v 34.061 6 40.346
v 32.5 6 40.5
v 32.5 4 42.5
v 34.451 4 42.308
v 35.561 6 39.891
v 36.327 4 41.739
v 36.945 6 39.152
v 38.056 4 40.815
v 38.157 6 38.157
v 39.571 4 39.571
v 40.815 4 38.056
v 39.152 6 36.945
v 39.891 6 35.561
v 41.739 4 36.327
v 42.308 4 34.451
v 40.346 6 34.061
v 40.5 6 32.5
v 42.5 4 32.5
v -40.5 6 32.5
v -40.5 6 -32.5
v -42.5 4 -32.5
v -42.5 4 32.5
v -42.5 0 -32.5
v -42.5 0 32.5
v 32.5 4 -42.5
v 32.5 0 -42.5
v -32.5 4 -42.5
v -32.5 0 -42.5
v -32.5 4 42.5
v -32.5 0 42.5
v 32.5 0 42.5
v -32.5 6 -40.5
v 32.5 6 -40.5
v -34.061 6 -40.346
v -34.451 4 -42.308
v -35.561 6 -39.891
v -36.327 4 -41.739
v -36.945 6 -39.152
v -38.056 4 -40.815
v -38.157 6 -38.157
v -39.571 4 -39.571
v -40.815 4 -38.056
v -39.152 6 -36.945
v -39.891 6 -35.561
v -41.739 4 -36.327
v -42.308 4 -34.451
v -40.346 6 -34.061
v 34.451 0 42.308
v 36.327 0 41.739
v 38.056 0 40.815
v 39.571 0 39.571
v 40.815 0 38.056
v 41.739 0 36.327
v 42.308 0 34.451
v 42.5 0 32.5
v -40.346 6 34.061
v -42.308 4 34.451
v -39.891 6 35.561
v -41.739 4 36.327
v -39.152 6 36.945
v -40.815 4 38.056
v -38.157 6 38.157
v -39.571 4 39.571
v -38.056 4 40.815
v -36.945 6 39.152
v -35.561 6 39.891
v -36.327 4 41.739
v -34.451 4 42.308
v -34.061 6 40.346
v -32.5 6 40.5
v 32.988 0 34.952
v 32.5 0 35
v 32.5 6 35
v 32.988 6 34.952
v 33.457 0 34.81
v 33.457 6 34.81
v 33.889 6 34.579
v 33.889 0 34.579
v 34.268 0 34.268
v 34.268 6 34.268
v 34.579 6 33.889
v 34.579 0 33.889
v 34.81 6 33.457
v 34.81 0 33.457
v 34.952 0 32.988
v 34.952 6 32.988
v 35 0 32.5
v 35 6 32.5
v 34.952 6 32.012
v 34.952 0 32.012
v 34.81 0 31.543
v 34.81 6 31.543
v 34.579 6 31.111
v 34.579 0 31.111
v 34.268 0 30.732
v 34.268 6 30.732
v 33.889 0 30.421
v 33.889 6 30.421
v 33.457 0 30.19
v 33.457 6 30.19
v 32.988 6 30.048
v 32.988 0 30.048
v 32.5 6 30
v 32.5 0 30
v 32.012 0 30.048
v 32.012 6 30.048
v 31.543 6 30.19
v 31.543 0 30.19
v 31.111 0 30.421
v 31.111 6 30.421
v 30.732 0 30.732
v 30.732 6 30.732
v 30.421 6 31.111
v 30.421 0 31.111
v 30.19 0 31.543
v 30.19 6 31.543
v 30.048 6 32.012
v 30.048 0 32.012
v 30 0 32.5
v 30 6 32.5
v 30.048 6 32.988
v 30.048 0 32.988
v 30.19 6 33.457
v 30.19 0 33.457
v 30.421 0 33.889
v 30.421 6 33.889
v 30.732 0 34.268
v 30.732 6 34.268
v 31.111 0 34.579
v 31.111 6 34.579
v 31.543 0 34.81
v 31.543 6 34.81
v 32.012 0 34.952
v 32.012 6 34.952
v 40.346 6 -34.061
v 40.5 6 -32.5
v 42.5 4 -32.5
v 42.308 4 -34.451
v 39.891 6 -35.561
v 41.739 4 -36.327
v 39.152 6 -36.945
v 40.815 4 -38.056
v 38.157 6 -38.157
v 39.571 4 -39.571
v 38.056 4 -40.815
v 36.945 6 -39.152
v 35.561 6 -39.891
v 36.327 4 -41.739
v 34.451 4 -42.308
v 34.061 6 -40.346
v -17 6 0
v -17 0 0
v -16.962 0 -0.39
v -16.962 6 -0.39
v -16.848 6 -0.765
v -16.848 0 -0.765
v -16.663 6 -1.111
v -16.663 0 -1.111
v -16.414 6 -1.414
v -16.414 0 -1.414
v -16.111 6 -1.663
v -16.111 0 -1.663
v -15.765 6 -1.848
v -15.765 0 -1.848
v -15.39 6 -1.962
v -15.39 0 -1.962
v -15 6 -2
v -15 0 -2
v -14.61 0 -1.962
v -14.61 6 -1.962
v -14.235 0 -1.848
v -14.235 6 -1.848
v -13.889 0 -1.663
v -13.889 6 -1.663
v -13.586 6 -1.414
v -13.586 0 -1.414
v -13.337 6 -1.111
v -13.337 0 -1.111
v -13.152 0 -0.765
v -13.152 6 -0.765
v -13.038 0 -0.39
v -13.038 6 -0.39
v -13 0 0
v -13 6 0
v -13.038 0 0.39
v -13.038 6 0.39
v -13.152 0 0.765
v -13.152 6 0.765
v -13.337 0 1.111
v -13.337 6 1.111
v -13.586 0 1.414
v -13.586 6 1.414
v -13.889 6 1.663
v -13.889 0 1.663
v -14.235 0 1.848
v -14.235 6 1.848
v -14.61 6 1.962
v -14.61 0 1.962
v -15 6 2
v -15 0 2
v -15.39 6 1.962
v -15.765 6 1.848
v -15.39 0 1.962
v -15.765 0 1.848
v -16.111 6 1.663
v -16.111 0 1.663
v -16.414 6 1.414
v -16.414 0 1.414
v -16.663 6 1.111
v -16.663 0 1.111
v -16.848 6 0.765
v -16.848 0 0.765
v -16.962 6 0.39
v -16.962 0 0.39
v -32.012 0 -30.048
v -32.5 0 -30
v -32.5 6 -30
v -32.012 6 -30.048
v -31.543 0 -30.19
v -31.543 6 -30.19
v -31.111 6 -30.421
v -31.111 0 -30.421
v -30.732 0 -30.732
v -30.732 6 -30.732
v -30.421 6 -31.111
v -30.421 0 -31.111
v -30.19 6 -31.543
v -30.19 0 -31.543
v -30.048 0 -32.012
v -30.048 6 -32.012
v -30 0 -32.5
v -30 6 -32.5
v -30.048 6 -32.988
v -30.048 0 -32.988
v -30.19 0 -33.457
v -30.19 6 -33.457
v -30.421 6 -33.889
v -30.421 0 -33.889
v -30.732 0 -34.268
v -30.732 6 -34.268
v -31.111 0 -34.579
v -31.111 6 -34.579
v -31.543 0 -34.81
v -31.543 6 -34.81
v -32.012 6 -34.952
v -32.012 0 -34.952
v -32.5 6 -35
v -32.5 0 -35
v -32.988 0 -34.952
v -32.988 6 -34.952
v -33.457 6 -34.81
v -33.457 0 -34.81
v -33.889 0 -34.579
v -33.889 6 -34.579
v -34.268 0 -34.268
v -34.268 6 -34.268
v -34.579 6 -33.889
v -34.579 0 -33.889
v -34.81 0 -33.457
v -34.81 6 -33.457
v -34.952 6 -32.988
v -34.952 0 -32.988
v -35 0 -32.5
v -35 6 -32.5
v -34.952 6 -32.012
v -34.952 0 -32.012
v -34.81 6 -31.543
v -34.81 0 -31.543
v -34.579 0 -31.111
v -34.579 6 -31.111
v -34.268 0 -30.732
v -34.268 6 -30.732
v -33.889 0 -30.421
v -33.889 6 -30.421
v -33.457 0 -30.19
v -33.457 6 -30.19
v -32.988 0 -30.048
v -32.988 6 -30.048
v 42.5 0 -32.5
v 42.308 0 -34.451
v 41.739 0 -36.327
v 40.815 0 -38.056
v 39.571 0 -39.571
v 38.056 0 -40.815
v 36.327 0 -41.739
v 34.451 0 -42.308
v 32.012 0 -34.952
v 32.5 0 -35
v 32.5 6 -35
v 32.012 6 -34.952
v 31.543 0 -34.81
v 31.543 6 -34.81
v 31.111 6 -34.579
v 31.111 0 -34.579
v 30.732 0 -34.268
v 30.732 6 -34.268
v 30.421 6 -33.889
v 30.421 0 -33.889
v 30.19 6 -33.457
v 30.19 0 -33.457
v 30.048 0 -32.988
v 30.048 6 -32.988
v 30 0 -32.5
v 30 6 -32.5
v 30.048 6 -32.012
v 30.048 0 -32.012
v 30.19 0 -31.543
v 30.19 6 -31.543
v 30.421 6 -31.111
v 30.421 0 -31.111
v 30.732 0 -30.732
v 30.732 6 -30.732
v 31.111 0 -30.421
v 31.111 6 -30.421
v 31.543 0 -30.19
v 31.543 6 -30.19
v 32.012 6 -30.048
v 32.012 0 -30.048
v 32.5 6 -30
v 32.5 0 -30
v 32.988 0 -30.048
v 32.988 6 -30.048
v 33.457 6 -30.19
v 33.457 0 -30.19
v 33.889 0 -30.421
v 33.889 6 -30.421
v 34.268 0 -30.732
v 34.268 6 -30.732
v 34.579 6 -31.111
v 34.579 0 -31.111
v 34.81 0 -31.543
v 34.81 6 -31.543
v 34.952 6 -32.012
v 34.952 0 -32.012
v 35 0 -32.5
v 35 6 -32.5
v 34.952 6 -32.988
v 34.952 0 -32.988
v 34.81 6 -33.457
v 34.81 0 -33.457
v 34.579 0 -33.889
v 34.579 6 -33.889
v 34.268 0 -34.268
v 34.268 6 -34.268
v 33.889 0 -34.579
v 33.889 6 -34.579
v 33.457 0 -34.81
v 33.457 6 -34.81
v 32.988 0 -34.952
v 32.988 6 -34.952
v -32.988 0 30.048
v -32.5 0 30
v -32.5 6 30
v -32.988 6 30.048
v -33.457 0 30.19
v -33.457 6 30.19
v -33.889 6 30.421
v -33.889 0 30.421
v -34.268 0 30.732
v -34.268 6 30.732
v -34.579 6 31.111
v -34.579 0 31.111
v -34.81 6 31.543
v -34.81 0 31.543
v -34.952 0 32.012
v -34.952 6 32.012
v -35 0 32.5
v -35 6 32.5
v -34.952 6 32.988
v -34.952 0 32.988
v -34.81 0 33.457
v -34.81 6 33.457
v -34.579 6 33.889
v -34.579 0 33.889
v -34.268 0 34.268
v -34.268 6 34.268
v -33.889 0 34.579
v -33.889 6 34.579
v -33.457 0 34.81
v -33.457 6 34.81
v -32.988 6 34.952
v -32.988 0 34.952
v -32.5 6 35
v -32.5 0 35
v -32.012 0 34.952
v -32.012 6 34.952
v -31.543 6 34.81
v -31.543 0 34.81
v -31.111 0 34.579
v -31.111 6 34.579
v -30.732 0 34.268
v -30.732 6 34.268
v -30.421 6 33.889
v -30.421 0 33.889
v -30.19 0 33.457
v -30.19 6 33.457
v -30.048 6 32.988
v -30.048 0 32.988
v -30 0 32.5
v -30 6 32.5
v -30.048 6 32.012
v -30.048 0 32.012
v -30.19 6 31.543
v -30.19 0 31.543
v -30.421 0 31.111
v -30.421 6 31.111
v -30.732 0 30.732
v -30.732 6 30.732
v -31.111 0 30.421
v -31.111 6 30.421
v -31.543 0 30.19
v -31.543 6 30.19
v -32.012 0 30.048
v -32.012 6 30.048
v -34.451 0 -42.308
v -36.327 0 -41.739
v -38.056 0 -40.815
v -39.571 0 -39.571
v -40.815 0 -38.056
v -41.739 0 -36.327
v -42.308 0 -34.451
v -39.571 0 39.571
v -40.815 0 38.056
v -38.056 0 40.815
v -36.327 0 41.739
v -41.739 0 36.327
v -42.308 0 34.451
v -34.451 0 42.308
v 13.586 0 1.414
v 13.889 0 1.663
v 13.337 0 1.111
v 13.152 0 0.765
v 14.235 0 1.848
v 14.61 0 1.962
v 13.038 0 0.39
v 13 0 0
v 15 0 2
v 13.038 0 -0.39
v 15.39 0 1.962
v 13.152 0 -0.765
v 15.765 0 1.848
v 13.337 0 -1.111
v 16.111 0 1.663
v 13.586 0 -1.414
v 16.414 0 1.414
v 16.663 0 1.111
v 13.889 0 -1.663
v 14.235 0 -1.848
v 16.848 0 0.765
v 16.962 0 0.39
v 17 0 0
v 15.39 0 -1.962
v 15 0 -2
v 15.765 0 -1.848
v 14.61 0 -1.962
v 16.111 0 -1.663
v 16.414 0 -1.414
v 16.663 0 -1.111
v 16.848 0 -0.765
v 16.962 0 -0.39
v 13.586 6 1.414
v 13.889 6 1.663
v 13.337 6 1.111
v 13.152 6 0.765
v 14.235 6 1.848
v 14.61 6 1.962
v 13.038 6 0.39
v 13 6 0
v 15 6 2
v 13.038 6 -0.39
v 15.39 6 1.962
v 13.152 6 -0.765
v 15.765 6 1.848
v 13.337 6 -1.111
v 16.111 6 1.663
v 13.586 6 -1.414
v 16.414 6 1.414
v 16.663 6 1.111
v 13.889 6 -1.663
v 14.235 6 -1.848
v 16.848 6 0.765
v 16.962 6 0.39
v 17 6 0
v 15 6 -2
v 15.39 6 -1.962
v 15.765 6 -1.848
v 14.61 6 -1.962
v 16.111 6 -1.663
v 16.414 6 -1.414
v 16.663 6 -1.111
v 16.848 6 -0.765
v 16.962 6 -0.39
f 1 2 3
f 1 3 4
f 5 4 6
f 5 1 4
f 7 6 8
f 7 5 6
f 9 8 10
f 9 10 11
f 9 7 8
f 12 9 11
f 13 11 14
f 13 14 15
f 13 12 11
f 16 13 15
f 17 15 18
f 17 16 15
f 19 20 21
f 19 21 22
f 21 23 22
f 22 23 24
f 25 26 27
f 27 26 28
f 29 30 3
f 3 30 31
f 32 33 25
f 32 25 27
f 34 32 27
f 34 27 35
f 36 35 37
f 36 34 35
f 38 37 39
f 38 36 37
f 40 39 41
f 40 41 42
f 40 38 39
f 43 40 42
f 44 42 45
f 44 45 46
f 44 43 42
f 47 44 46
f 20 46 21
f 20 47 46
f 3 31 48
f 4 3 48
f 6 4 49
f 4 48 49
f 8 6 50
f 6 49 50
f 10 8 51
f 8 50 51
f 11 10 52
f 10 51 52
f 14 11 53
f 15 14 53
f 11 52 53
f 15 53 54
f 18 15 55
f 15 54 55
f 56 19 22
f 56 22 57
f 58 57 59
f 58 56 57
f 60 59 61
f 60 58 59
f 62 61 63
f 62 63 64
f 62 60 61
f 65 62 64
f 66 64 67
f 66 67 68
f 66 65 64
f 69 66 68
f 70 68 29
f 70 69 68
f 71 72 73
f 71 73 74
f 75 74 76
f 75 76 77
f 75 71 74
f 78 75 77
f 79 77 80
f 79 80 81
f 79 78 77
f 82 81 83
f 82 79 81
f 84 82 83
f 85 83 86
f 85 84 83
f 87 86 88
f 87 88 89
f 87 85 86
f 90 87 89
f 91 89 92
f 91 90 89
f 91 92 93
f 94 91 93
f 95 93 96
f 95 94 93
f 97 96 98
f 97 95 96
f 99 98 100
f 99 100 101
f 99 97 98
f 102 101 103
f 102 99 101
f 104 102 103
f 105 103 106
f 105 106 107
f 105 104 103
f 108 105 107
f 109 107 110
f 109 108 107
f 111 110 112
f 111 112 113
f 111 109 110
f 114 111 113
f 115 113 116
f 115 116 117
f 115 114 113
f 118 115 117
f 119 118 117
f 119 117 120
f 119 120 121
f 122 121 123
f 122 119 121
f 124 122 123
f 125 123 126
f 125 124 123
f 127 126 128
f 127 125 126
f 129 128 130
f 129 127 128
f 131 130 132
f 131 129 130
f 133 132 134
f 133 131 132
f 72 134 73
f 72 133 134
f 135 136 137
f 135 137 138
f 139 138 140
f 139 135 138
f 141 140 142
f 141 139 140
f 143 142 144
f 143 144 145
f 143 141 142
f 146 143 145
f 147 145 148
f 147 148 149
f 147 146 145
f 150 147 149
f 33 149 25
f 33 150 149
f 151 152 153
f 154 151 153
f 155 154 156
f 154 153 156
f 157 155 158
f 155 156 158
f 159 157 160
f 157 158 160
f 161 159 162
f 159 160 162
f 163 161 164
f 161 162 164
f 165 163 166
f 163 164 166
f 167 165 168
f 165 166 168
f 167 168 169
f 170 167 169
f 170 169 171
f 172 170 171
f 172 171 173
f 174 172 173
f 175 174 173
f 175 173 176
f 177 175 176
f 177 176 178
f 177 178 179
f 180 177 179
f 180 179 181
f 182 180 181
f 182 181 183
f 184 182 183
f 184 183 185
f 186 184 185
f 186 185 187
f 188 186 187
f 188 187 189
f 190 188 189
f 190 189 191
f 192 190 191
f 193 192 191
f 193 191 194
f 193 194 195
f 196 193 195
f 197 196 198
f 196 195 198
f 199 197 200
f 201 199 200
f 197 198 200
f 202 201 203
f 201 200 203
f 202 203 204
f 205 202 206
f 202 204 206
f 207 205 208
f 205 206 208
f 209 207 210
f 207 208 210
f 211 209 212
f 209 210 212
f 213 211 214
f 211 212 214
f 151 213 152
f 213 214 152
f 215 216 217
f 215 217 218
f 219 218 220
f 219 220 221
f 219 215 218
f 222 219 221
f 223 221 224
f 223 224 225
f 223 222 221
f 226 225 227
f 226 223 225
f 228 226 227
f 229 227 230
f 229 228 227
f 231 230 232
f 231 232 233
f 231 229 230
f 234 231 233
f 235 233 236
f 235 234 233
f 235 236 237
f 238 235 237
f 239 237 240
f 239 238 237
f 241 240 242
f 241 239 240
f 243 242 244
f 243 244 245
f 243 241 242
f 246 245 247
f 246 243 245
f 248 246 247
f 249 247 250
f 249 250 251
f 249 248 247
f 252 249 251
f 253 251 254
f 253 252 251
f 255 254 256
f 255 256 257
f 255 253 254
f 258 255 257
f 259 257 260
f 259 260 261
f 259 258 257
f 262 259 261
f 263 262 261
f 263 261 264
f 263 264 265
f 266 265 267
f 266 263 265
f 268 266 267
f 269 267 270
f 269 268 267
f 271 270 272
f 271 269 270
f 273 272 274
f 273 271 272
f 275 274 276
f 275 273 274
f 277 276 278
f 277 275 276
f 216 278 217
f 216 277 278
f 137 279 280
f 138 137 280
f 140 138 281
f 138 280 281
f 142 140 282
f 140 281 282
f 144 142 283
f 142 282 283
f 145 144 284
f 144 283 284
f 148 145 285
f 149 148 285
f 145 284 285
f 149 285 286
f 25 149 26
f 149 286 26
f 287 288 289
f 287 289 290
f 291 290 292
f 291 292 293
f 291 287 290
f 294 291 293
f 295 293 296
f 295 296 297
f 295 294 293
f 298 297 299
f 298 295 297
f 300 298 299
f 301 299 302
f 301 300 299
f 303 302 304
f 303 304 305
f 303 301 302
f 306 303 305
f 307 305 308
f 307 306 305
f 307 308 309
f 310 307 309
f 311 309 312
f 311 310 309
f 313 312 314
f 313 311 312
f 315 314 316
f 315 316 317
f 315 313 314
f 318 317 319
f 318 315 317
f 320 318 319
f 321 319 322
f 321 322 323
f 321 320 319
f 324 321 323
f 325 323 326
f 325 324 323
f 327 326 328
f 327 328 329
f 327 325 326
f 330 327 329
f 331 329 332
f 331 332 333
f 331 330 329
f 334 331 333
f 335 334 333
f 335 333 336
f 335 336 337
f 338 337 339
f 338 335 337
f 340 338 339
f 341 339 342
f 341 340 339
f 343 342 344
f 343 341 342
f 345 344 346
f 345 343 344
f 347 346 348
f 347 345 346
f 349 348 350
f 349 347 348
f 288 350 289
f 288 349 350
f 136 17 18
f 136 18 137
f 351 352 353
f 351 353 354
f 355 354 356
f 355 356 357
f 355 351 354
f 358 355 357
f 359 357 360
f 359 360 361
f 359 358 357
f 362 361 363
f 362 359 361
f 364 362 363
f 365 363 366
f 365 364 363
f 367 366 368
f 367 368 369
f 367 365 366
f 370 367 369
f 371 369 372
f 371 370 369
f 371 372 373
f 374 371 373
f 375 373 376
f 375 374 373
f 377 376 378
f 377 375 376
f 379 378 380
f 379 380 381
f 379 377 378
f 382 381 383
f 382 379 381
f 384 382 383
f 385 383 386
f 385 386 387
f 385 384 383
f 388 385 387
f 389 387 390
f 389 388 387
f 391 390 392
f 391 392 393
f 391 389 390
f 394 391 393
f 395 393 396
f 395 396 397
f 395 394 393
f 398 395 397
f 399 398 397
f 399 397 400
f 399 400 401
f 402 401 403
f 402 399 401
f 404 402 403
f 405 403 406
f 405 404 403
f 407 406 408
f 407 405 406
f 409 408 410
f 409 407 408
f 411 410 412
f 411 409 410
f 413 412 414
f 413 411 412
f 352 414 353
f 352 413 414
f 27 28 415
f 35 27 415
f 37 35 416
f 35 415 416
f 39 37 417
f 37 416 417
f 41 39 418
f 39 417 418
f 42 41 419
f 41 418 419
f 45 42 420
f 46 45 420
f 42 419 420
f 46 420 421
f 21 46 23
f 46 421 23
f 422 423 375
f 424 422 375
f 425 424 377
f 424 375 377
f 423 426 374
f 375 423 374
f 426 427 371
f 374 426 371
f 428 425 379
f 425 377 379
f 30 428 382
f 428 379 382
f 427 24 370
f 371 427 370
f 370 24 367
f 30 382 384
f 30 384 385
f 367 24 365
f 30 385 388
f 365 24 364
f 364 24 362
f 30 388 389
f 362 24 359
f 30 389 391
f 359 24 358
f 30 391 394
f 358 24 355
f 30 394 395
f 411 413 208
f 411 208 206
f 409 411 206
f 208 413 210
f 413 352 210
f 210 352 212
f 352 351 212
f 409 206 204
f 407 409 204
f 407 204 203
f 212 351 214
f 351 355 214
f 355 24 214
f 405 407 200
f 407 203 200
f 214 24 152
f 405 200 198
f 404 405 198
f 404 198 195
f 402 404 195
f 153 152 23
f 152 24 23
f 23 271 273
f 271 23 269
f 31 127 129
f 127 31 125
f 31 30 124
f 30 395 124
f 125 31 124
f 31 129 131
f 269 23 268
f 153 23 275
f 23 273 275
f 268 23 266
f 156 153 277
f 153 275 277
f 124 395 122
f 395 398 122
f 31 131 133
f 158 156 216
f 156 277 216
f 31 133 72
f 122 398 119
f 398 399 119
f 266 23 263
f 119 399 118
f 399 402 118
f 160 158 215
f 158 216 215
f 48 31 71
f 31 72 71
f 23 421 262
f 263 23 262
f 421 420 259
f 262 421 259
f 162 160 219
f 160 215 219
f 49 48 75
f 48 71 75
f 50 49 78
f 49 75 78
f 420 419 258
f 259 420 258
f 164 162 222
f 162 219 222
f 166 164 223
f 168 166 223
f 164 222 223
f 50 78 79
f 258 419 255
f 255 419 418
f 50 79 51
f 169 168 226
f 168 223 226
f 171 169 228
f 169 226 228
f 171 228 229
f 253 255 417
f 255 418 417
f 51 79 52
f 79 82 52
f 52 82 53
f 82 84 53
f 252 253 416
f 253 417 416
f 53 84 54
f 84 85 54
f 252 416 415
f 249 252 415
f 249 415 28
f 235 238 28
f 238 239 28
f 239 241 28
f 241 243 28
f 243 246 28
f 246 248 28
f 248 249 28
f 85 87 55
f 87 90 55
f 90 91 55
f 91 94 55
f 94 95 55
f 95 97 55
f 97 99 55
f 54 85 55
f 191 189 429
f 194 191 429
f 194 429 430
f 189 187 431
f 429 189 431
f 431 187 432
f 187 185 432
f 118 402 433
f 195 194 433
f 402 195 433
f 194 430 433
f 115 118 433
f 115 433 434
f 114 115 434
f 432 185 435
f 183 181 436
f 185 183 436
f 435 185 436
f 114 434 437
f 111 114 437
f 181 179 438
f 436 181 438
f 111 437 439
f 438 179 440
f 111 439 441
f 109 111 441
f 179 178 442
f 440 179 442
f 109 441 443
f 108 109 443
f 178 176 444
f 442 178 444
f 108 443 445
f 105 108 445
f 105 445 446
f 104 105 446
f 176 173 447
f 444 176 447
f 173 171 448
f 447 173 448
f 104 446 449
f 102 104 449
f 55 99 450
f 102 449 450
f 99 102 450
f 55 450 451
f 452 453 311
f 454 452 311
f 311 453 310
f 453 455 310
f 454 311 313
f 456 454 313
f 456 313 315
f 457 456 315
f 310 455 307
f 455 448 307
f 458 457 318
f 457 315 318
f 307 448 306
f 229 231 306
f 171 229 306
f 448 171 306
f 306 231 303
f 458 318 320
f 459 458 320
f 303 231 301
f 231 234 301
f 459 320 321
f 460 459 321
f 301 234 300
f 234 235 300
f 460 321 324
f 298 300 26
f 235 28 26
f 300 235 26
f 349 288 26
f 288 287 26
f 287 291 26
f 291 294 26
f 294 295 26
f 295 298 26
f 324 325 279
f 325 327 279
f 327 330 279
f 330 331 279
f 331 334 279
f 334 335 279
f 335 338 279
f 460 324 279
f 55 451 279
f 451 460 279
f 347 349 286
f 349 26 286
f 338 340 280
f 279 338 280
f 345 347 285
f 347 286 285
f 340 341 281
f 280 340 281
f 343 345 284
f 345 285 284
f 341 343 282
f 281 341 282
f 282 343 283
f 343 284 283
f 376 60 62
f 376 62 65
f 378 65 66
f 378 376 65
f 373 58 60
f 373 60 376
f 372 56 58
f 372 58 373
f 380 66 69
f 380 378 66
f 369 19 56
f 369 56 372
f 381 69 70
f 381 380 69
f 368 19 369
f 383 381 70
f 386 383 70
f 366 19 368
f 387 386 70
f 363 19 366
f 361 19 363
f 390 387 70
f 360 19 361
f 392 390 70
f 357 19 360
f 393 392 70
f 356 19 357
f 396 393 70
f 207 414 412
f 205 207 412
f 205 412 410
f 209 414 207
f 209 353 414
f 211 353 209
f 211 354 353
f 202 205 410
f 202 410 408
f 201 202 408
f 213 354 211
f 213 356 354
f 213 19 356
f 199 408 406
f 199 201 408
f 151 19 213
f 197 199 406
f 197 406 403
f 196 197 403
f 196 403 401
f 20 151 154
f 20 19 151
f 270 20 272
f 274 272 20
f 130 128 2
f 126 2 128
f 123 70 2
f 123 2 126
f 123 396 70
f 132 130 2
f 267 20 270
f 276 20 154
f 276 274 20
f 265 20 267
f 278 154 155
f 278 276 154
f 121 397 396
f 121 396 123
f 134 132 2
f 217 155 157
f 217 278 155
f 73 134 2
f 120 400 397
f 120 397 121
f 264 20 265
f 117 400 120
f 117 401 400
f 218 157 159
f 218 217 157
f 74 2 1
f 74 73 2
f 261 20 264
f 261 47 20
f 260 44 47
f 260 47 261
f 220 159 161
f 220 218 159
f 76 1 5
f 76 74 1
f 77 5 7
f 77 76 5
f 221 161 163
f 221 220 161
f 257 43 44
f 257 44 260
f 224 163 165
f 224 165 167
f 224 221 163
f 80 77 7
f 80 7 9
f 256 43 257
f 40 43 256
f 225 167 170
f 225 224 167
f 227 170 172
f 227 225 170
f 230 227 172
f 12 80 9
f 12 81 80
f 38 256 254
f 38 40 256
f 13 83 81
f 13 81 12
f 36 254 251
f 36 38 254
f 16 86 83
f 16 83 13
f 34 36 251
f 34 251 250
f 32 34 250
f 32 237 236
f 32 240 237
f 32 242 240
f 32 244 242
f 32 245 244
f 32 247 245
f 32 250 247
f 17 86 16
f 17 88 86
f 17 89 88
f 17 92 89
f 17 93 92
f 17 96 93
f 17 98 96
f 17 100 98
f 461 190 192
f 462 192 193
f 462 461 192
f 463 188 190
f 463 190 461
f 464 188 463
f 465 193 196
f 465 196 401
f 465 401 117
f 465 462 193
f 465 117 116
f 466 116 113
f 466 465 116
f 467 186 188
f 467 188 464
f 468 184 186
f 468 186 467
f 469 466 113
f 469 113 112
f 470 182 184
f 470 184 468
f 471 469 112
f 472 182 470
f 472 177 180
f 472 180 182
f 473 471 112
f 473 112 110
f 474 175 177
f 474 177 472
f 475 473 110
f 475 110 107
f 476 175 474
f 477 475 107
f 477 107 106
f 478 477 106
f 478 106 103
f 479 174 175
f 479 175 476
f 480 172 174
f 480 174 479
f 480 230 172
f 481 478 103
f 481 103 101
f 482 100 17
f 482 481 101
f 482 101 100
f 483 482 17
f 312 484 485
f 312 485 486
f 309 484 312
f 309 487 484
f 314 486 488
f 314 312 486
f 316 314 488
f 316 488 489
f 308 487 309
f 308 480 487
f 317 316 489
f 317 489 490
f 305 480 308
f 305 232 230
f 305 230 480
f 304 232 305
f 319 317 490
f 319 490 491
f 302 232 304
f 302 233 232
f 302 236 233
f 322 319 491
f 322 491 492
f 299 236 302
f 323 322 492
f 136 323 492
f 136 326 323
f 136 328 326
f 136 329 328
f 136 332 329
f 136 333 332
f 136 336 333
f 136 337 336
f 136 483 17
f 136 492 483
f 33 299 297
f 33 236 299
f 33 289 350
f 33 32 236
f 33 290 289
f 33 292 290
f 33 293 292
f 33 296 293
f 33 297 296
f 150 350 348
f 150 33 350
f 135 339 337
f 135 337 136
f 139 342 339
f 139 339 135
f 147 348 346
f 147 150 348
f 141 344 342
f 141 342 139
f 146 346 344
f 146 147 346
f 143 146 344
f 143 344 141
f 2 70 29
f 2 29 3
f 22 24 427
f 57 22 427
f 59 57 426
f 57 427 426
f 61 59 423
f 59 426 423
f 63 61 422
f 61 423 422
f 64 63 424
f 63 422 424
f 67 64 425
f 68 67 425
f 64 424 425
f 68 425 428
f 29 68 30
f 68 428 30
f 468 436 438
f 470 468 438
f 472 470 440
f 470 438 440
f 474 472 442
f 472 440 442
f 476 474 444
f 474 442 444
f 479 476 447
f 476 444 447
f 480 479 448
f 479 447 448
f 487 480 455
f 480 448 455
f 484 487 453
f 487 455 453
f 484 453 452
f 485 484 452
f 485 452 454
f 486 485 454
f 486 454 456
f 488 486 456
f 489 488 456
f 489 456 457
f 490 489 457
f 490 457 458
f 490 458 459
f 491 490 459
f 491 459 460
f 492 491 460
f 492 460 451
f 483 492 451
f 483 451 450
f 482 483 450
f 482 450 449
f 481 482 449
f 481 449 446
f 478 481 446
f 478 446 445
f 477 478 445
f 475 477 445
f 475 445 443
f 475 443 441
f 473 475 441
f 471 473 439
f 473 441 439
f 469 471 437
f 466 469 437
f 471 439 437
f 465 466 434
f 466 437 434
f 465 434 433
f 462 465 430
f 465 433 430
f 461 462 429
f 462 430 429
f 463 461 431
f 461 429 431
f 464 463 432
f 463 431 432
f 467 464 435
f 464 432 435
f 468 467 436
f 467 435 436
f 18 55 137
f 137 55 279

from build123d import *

# Parameters (mm, degrees)
SKETCH1_R                 = 2.5
BOSS_EXTRUDE1_DEPTH       = 6
CHAMFER1_SIZE             = 2
M4X0_7_TAPPED_HOLE2_D     = 4
M4X0_7_TAPPED_HOLE2_DEPTH = 8.898278762
M4X0_7_TAPPED_HOLE2_TIP   = 1.201721238


with BuildPart() as part:
    # Sketch1 → Boss-Extrude1 (new body)
    with BuildSketch(Plane(origin=(0, 0, 0), x_dir=(1, 0, 0), z_dir=(0, 1, 0))):
        with BuildLine():
            Line((-32.5, -42.5), (32.5, -42.5))
            ThreePointArc((32.5, -42.5), (39.571067812, -39.571067812), (42.5, -32.5))
            Line((42.5, -32.5), (42.5, 32.5))
            ThreePointArc((42.5, 32.5), (39.571067812, 39.571067812), (32.5, 42.5))
            Line((32.5, 42.5), (-32.5, 42.5))
            ThreePointArc((-32.5, 42.5), (-39.571067812, 39.571067812), (-42.5, 32.5))
            Line((-42.5, 32.5), (-42.5, -32.5))
            ThreePointArc((-42.5, -32.5), (-39.571067812, -39.571067812), (-32.5, -42.5))
        make_face()
        with Locations(Location((-32.5, 32.5, 0), (0, 0, 270))):
            Circle(SKETCH1_R, mode=Mode.SUBTRACT)
        with Locations(Location((32.5, 32.5, 0), (0, 0, 90))):
            Circle(SKETCH1_R, mode=Mode.SUBTRACT)
        with Locations(Location((32.5, -32.5, 0), (0, 0, 270))):
            Circle(SKETCH1_R, mode=Mode.SUBTRACT)
        with Locations(Location((-32.5, -32.5, 0), (0, 0, 90))):
            Circle(SKETCH1_R, mode=Mode.SUBTRACT)
    extrude(amount=BOSS_EXTRUDE1_DEPTH)

    # Chamfer1
    chamfer1_edges = [part.edges().sort_by_distance(p)[0] for p in [
        (39.571067812, 6, -39.571067812),
        (42.5, 6, 0),
        (39.571067812, 6, 39.571067812),
        (0, 6, 42.5),
        (-39.571067812, 6, 39.571067812),
    ]]
    chamfer(chamfer1_edges, length=CHAMFER1_SIZE)

    # M4x0.7 Tapped Hole2
    with Locations(Plane(origin=(0, 6, 0), x_dir=(1, 0, 0), z_dir=(0, 1, 0))):
        with Locations((-15, 0), (15, 0)):
            Hole(M4X0_7_TAPPED_HOLE2_D / 2, depth=M4X0_7_TAPPED_HOLE2_DEPTH)
            with Locations((0, 0, -(M4X0_7_TAPPED_HOLE2_DEPTH + M4X0_7_TAPPED_HOLE2_TIP / 2))):  # 118° drill point
                Cone(0, M4X0_7_TAPPED_HOLE2_D / 2, M4X0_7_TAPPED_HOLE2_TIP, mode=Mode.SUBTRACT)


solid = part.part
